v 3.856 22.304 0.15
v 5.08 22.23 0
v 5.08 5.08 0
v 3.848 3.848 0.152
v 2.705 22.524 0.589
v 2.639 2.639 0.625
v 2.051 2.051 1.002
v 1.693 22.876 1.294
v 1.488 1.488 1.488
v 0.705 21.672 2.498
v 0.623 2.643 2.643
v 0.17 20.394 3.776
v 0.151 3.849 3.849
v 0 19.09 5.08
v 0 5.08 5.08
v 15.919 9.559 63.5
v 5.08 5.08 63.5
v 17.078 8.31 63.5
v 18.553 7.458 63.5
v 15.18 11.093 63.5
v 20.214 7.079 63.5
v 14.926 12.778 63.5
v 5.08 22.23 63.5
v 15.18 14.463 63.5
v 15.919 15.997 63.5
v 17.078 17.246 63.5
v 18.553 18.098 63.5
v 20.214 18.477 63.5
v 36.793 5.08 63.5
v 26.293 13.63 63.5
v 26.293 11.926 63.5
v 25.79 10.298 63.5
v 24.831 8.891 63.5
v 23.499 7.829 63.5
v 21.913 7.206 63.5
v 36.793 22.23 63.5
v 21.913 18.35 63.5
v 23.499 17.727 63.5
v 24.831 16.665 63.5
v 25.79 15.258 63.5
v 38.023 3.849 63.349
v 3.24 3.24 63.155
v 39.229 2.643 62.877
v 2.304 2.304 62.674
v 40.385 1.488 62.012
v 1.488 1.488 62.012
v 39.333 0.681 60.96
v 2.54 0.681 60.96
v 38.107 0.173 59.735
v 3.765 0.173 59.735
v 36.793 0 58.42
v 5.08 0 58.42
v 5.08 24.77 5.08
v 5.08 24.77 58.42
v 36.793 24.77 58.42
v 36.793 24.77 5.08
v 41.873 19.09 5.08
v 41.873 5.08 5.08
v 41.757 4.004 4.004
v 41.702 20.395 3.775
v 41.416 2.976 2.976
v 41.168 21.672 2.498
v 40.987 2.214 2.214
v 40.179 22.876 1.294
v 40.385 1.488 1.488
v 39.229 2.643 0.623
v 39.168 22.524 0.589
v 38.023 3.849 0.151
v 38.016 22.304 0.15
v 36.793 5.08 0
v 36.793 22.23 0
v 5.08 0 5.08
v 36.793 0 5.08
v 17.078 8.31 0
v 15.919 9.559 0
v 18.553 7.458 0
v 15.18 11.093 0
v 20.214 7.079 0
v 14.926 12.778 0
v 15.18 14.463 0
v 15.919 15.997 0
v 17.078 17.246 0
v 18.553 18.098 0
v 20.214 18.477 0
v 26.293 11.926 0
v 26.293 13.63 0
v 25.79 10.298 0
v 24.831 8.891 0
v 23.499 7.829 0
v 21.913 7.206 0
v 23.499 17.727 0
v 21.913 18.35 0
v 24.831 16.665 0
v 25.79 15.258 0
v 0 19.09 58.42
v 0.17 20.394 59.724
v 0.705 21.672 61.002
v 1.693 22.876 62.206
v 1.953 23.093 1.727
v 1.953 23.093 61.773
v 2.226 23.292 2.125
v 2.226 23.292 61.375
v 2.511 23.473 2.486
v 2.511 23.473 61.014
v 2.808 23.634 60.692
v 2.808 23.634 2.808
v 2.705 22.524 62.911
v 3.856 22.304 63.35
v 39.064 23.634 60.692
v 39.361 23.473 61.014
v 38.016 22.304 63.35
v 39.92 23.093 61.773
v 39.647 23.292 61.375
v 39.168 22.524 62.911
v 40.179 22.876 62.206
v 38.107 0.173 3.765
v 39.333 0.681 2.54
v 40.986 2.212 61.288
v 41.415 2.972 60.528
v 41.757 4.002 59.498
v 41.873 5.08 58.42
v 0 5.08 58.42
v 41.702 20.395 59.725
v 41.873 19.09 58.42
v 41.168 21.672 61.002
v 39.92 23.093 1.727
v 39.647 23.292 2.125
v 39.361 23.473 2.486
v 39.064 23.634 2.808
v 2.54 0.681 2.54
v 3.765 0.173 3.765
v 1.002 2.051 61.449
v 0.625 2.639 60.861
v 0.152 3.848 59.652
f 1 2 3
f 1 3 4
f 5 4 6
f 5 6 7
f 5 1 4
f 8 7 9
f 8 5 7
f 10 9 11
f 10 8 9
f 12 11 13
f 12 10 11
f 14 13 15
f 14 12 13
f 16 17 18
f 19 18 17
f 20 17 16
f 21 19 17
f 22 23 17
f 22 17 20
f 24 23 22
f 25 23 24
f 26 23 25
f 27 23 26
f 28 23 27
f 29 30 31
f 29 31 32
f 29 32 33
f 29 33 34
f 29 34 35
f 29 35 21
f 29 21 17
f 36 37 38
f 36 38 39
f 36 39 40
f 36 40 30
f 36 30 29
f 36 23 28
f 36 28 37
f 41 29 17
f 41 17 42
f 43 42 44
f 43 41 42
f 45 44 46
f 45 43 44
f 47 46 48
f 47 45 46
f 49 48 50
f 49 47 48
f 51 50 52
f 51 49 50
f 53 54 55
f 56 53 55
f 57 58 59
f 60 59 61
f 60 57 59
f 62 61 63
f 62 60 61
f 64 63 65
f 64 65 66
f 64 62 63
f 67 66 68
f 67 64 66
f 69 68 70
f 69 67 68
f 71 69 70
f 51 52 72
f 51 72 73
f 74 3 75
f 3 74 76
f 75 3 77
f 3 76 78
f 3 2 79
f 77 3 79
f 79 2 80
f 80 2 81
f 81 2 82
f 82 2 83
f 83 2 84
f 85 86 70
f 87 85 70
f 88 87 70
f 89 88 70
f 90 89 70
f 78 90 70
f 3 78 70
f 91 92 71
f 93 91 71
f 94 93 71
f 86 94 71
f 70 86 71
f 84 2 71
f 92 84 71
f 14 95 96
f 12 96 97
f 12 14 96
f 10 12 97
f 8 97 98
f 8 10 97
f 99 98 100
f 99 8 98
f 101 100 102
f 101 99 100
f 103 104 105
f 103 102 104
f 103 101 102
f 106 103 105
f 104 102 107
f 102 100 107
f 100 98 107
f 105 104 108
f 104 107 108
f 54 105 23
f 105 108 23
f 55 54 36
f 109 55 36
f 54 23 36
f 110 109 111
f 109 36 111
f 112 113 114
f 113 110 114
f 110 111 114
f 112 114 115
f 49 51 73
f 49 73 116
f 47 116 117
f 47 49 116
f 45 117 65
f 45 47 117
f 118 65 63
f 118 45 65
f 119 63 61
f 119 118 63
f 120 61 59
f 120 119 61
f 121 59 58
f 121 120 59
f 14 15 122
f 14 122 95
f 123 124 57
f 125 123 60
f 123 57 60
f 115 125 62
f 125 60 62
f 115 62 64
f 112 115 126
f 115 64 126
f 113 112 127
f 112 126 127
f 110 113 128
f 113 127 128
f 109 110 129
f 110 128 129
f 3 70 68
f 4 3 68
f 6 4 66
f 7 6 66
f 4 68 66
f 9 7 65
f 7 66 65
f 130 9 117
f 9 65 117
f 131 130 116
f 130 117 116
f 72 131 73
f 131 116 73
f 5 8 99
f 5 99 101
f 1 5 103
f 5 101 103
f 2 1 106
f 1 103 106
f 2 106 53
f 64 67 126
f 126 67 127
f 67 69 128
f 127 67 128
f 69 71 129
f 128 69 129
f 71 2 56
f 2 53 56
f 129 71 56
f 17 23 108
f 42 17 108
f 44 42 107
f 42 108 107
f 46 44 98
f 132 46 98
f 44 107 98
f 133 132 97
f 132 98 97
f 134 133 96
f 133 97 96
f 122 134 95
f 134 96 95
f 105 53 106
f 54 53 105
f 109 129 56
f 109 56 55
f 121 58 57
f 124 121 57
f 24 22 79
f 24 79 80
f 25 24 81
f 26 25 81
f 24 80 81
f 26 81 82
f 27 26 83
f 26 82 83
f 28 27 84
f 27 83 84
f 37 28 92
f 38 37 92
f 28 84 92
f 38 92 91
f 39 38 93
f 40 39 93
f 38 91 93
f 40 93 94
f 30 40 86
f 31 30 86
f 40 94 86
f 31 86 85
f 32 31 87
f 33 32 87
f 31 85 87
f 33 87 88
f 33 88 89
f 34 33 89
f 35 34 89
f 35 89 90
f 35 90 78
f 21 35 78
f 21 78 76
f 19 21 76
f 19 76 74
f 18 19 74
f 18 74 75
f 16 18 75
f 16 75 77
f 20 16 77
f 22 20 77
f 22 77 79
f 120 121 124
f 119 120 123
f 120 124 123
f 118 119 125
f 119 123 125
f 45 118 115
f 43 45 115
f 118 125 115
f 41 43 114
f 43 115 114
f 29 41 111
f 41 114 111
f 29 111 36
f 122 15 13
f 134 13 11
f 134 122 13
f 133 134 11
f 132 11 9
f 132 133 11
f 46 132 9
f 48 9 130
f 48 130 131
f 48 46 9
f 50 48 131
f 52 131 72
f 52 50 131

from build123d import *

# Parameters (mm, degrees)
F0_W        = 41.8725572526
F0_H        = 24.7696824372
F1_DEPTH    = 63.5
F3_D        = 11.43
F4_C1_SIZE2 = 5.08
F4_C1_SIZE  = 2.54
F4_C2_SIZE2 = 2.54
F4_C2_SIZE  = 5.08
F4_C3_SIZE2 = 5.08
F4_C3_SIZE  = 2.54
F4_C4_SIZE2 = 2.54
F4_C4_SIZE  = 5.08
F5_R        = 5.08
F6_T1_DEPTH = 42.5496824372
F6_T3_DEPTH = 79.1980633142
F7_T1_DEPTH = 42.5496824372
F7_T3_DEPTH = 79.1980633142


# Not quite as in the source:
# - a fillet or chamfer that OpenCascade refuses, or shapes differently, is made with other operations: its cross-section is extruded or revolved along the edge and cut away or added


with BuildPart() as f1:
    # F0 (on Top) → F1 (new body)
    with BuildSketch(Plane.XY):
        with Locations((20.9362786263, 12.3848412186)):
            Rectangle(F0_W, F0_H)
    extrude(amount=F1_DEPTH)

    # F3 (through all)
    with Locations(Plane.XY.offset(63.5)):
        with Locations((20.6414014101, 12.7780102193)):
            Hole(F3_D / 2)

    # F4: chamfer of 2.54 x 5.08 on 4 edges, made by hand

    # F4_c1
    f4_c1_edges = [f1.edges().sort_by_distance(p)[0] for p in [
        (0, 24.7696824372, 31.75),
    ]]
    f4_c1_side = f1.faces().sort_by_distance((0, 24.7188824372, 31.75))[0]
    chamfer(f4_c1_edges, length=F4_C1_SIZE, length2=F4_C1_SIZE2, reference=f4_c1_side)

    # F4_c2
    f4_c2_edges = [f1.edges().sort_by_distance(p)[0] for p in [
        (41.8725572526, 24.7696824372, 31.75),
    ]]
    f4_c2_side = f1.faces().sort_by_distance((41.8217572526, 24.7696824372, 31.75))[0]
    chamfer(f4_c2_edges, length=F4_C2_SIZE, length2=F4_C2_SIZE2, reference=f4_c2_side)

    # F4_c3
    f4_c3_edges = [f1.edges().sort_by_distance(p)[0] for p in [
        (20.9362786263, 24.7696824372, 0),
    ]]
    f4_c3_side = f1.faces().sort_by_distance((20.9362786263, 24.7188824372, 0))[0]
    chamfer(f4_c3_edges, length=F4_C3_SIZE, length2=F4_C3_SIZE2, reference=f4_c3_side)

    # F4_c4
    f4_c4_edges = [f1.edges().sort_by_distance(p)[0] for p in [
        (20.9362786263, 24.7696824372, 63.5),
    ]]
    f4_c4_side = f1.faces().sort_by_distance((20.9362786263, 24.7696824372, 63.4492))[0]
    chamfer(f4_c4_edges, length=F4_C4_SIZE, length2=F4_C4_SIZE2, reference=f4_c4_side)

    # F5
    f5_edges = [f1.edges().sort_by_distance(p)[0] for p in [
        (0, 0, 31.75),
        (41.872557, 0, 31.75),
        (20.936279, 0, 0),
        (20.936279, 0, 63.5),
    ]]
    fillet(f5_edges, radius=F5_R)

    # F6: fillet of radius 5.08 on 4 edges, made by hand

    # F6_s2 → F6_t1 (cut)
    with BuildSketch(Plane.XZ.offset(-34.9296824372)):
        with BuildLine():
            ThreePointArc((5.08, 0), (1.4878975516, 1.4878975516), (0, 5.08))
            Line((0, 5.08), (0, 0))
            Line((0, 0), (5.08, 0))
        make_face()
        with BuildLine():
            ThreePointArc((5.08, 63.5), (1.4878975516, 62.0121024484), (0, 58.42))
            Line((0, 58.42), (0, 63.5))
            Line((0, 63.5), (5.08, 63.5))
        make_face()
    extrude(amount=F6_T1_DEPTH, mode=Mode.SUBTRACT)

    # F6_s4 → F6_t3 (cut)
    with BuildSketch(Plane.XY.offset(-7.8490316571)):
        with BuildLine():
            ThreePointArc((0, 19.0900697743), (0.7586938936, 21.7607838239), (2.8081549349, 23.6337599046))
            Line((2.8081549349, 23.6337599046), (0, 22.2296824372))
            Line((0, 22.2296824372), (0, 19.0900697743))
        make_face()
    extrude(amount=F6_T3_DEPTH, mode=Mode.SUBTRACT)

    # F7: fillet of radius 5.08 on 4 edges, made by hand

    # F7_s2 → F7_t1 (cut)
    with BuildSketch(Plane.XZ.offset(-34.9296824372)):
        with BuildLine():
            ThreePointArc((41.8725572526, 5.08), (40.3846597011, 1.4878975516), (36.7925572526, 0))
            Line((36.7925572526, 0), (41.8725572526, 0))
            Line((41.8725572526, 0), (41.8725572526, 5.08))
        make_face()
        with BuildLine():
            ThreePointArc((41.8725572526, 58.42), (40.3846597011, 62.0121024484), (36.7925572526, 63.5))
            Line((36.7925572526, 63.5), (41.8725572526, 63.5))
            Line((41.8725572526, 63.5), (41.8725572526, 58.42))
        make_face()
    extrude(amount=F7_T1_DEPTH, mode=Mode.SUBTRACT)

    # F7_s4 → F7_t3 (cut)
    with BuildSketch(Plane.XY.offset(-7.8490316571)):
        with BuildLine():
            ThreePointArc((41.8725572526, 19.0900697743), (41.1138633591, 21.7607838239), (39.0644023178, 23.6337599046))
            Line((39.0644023178, 23.6337599046), (41.8725572526, 22.2296824372))
            Line((41.8725572526, 22.2296824372), (41.8725572526, 19.0900697743))
        make_face()
    extrude(amount=F7_T3_DEPTH, mode=Mode.SUBTRACT)


solid = f1.part
